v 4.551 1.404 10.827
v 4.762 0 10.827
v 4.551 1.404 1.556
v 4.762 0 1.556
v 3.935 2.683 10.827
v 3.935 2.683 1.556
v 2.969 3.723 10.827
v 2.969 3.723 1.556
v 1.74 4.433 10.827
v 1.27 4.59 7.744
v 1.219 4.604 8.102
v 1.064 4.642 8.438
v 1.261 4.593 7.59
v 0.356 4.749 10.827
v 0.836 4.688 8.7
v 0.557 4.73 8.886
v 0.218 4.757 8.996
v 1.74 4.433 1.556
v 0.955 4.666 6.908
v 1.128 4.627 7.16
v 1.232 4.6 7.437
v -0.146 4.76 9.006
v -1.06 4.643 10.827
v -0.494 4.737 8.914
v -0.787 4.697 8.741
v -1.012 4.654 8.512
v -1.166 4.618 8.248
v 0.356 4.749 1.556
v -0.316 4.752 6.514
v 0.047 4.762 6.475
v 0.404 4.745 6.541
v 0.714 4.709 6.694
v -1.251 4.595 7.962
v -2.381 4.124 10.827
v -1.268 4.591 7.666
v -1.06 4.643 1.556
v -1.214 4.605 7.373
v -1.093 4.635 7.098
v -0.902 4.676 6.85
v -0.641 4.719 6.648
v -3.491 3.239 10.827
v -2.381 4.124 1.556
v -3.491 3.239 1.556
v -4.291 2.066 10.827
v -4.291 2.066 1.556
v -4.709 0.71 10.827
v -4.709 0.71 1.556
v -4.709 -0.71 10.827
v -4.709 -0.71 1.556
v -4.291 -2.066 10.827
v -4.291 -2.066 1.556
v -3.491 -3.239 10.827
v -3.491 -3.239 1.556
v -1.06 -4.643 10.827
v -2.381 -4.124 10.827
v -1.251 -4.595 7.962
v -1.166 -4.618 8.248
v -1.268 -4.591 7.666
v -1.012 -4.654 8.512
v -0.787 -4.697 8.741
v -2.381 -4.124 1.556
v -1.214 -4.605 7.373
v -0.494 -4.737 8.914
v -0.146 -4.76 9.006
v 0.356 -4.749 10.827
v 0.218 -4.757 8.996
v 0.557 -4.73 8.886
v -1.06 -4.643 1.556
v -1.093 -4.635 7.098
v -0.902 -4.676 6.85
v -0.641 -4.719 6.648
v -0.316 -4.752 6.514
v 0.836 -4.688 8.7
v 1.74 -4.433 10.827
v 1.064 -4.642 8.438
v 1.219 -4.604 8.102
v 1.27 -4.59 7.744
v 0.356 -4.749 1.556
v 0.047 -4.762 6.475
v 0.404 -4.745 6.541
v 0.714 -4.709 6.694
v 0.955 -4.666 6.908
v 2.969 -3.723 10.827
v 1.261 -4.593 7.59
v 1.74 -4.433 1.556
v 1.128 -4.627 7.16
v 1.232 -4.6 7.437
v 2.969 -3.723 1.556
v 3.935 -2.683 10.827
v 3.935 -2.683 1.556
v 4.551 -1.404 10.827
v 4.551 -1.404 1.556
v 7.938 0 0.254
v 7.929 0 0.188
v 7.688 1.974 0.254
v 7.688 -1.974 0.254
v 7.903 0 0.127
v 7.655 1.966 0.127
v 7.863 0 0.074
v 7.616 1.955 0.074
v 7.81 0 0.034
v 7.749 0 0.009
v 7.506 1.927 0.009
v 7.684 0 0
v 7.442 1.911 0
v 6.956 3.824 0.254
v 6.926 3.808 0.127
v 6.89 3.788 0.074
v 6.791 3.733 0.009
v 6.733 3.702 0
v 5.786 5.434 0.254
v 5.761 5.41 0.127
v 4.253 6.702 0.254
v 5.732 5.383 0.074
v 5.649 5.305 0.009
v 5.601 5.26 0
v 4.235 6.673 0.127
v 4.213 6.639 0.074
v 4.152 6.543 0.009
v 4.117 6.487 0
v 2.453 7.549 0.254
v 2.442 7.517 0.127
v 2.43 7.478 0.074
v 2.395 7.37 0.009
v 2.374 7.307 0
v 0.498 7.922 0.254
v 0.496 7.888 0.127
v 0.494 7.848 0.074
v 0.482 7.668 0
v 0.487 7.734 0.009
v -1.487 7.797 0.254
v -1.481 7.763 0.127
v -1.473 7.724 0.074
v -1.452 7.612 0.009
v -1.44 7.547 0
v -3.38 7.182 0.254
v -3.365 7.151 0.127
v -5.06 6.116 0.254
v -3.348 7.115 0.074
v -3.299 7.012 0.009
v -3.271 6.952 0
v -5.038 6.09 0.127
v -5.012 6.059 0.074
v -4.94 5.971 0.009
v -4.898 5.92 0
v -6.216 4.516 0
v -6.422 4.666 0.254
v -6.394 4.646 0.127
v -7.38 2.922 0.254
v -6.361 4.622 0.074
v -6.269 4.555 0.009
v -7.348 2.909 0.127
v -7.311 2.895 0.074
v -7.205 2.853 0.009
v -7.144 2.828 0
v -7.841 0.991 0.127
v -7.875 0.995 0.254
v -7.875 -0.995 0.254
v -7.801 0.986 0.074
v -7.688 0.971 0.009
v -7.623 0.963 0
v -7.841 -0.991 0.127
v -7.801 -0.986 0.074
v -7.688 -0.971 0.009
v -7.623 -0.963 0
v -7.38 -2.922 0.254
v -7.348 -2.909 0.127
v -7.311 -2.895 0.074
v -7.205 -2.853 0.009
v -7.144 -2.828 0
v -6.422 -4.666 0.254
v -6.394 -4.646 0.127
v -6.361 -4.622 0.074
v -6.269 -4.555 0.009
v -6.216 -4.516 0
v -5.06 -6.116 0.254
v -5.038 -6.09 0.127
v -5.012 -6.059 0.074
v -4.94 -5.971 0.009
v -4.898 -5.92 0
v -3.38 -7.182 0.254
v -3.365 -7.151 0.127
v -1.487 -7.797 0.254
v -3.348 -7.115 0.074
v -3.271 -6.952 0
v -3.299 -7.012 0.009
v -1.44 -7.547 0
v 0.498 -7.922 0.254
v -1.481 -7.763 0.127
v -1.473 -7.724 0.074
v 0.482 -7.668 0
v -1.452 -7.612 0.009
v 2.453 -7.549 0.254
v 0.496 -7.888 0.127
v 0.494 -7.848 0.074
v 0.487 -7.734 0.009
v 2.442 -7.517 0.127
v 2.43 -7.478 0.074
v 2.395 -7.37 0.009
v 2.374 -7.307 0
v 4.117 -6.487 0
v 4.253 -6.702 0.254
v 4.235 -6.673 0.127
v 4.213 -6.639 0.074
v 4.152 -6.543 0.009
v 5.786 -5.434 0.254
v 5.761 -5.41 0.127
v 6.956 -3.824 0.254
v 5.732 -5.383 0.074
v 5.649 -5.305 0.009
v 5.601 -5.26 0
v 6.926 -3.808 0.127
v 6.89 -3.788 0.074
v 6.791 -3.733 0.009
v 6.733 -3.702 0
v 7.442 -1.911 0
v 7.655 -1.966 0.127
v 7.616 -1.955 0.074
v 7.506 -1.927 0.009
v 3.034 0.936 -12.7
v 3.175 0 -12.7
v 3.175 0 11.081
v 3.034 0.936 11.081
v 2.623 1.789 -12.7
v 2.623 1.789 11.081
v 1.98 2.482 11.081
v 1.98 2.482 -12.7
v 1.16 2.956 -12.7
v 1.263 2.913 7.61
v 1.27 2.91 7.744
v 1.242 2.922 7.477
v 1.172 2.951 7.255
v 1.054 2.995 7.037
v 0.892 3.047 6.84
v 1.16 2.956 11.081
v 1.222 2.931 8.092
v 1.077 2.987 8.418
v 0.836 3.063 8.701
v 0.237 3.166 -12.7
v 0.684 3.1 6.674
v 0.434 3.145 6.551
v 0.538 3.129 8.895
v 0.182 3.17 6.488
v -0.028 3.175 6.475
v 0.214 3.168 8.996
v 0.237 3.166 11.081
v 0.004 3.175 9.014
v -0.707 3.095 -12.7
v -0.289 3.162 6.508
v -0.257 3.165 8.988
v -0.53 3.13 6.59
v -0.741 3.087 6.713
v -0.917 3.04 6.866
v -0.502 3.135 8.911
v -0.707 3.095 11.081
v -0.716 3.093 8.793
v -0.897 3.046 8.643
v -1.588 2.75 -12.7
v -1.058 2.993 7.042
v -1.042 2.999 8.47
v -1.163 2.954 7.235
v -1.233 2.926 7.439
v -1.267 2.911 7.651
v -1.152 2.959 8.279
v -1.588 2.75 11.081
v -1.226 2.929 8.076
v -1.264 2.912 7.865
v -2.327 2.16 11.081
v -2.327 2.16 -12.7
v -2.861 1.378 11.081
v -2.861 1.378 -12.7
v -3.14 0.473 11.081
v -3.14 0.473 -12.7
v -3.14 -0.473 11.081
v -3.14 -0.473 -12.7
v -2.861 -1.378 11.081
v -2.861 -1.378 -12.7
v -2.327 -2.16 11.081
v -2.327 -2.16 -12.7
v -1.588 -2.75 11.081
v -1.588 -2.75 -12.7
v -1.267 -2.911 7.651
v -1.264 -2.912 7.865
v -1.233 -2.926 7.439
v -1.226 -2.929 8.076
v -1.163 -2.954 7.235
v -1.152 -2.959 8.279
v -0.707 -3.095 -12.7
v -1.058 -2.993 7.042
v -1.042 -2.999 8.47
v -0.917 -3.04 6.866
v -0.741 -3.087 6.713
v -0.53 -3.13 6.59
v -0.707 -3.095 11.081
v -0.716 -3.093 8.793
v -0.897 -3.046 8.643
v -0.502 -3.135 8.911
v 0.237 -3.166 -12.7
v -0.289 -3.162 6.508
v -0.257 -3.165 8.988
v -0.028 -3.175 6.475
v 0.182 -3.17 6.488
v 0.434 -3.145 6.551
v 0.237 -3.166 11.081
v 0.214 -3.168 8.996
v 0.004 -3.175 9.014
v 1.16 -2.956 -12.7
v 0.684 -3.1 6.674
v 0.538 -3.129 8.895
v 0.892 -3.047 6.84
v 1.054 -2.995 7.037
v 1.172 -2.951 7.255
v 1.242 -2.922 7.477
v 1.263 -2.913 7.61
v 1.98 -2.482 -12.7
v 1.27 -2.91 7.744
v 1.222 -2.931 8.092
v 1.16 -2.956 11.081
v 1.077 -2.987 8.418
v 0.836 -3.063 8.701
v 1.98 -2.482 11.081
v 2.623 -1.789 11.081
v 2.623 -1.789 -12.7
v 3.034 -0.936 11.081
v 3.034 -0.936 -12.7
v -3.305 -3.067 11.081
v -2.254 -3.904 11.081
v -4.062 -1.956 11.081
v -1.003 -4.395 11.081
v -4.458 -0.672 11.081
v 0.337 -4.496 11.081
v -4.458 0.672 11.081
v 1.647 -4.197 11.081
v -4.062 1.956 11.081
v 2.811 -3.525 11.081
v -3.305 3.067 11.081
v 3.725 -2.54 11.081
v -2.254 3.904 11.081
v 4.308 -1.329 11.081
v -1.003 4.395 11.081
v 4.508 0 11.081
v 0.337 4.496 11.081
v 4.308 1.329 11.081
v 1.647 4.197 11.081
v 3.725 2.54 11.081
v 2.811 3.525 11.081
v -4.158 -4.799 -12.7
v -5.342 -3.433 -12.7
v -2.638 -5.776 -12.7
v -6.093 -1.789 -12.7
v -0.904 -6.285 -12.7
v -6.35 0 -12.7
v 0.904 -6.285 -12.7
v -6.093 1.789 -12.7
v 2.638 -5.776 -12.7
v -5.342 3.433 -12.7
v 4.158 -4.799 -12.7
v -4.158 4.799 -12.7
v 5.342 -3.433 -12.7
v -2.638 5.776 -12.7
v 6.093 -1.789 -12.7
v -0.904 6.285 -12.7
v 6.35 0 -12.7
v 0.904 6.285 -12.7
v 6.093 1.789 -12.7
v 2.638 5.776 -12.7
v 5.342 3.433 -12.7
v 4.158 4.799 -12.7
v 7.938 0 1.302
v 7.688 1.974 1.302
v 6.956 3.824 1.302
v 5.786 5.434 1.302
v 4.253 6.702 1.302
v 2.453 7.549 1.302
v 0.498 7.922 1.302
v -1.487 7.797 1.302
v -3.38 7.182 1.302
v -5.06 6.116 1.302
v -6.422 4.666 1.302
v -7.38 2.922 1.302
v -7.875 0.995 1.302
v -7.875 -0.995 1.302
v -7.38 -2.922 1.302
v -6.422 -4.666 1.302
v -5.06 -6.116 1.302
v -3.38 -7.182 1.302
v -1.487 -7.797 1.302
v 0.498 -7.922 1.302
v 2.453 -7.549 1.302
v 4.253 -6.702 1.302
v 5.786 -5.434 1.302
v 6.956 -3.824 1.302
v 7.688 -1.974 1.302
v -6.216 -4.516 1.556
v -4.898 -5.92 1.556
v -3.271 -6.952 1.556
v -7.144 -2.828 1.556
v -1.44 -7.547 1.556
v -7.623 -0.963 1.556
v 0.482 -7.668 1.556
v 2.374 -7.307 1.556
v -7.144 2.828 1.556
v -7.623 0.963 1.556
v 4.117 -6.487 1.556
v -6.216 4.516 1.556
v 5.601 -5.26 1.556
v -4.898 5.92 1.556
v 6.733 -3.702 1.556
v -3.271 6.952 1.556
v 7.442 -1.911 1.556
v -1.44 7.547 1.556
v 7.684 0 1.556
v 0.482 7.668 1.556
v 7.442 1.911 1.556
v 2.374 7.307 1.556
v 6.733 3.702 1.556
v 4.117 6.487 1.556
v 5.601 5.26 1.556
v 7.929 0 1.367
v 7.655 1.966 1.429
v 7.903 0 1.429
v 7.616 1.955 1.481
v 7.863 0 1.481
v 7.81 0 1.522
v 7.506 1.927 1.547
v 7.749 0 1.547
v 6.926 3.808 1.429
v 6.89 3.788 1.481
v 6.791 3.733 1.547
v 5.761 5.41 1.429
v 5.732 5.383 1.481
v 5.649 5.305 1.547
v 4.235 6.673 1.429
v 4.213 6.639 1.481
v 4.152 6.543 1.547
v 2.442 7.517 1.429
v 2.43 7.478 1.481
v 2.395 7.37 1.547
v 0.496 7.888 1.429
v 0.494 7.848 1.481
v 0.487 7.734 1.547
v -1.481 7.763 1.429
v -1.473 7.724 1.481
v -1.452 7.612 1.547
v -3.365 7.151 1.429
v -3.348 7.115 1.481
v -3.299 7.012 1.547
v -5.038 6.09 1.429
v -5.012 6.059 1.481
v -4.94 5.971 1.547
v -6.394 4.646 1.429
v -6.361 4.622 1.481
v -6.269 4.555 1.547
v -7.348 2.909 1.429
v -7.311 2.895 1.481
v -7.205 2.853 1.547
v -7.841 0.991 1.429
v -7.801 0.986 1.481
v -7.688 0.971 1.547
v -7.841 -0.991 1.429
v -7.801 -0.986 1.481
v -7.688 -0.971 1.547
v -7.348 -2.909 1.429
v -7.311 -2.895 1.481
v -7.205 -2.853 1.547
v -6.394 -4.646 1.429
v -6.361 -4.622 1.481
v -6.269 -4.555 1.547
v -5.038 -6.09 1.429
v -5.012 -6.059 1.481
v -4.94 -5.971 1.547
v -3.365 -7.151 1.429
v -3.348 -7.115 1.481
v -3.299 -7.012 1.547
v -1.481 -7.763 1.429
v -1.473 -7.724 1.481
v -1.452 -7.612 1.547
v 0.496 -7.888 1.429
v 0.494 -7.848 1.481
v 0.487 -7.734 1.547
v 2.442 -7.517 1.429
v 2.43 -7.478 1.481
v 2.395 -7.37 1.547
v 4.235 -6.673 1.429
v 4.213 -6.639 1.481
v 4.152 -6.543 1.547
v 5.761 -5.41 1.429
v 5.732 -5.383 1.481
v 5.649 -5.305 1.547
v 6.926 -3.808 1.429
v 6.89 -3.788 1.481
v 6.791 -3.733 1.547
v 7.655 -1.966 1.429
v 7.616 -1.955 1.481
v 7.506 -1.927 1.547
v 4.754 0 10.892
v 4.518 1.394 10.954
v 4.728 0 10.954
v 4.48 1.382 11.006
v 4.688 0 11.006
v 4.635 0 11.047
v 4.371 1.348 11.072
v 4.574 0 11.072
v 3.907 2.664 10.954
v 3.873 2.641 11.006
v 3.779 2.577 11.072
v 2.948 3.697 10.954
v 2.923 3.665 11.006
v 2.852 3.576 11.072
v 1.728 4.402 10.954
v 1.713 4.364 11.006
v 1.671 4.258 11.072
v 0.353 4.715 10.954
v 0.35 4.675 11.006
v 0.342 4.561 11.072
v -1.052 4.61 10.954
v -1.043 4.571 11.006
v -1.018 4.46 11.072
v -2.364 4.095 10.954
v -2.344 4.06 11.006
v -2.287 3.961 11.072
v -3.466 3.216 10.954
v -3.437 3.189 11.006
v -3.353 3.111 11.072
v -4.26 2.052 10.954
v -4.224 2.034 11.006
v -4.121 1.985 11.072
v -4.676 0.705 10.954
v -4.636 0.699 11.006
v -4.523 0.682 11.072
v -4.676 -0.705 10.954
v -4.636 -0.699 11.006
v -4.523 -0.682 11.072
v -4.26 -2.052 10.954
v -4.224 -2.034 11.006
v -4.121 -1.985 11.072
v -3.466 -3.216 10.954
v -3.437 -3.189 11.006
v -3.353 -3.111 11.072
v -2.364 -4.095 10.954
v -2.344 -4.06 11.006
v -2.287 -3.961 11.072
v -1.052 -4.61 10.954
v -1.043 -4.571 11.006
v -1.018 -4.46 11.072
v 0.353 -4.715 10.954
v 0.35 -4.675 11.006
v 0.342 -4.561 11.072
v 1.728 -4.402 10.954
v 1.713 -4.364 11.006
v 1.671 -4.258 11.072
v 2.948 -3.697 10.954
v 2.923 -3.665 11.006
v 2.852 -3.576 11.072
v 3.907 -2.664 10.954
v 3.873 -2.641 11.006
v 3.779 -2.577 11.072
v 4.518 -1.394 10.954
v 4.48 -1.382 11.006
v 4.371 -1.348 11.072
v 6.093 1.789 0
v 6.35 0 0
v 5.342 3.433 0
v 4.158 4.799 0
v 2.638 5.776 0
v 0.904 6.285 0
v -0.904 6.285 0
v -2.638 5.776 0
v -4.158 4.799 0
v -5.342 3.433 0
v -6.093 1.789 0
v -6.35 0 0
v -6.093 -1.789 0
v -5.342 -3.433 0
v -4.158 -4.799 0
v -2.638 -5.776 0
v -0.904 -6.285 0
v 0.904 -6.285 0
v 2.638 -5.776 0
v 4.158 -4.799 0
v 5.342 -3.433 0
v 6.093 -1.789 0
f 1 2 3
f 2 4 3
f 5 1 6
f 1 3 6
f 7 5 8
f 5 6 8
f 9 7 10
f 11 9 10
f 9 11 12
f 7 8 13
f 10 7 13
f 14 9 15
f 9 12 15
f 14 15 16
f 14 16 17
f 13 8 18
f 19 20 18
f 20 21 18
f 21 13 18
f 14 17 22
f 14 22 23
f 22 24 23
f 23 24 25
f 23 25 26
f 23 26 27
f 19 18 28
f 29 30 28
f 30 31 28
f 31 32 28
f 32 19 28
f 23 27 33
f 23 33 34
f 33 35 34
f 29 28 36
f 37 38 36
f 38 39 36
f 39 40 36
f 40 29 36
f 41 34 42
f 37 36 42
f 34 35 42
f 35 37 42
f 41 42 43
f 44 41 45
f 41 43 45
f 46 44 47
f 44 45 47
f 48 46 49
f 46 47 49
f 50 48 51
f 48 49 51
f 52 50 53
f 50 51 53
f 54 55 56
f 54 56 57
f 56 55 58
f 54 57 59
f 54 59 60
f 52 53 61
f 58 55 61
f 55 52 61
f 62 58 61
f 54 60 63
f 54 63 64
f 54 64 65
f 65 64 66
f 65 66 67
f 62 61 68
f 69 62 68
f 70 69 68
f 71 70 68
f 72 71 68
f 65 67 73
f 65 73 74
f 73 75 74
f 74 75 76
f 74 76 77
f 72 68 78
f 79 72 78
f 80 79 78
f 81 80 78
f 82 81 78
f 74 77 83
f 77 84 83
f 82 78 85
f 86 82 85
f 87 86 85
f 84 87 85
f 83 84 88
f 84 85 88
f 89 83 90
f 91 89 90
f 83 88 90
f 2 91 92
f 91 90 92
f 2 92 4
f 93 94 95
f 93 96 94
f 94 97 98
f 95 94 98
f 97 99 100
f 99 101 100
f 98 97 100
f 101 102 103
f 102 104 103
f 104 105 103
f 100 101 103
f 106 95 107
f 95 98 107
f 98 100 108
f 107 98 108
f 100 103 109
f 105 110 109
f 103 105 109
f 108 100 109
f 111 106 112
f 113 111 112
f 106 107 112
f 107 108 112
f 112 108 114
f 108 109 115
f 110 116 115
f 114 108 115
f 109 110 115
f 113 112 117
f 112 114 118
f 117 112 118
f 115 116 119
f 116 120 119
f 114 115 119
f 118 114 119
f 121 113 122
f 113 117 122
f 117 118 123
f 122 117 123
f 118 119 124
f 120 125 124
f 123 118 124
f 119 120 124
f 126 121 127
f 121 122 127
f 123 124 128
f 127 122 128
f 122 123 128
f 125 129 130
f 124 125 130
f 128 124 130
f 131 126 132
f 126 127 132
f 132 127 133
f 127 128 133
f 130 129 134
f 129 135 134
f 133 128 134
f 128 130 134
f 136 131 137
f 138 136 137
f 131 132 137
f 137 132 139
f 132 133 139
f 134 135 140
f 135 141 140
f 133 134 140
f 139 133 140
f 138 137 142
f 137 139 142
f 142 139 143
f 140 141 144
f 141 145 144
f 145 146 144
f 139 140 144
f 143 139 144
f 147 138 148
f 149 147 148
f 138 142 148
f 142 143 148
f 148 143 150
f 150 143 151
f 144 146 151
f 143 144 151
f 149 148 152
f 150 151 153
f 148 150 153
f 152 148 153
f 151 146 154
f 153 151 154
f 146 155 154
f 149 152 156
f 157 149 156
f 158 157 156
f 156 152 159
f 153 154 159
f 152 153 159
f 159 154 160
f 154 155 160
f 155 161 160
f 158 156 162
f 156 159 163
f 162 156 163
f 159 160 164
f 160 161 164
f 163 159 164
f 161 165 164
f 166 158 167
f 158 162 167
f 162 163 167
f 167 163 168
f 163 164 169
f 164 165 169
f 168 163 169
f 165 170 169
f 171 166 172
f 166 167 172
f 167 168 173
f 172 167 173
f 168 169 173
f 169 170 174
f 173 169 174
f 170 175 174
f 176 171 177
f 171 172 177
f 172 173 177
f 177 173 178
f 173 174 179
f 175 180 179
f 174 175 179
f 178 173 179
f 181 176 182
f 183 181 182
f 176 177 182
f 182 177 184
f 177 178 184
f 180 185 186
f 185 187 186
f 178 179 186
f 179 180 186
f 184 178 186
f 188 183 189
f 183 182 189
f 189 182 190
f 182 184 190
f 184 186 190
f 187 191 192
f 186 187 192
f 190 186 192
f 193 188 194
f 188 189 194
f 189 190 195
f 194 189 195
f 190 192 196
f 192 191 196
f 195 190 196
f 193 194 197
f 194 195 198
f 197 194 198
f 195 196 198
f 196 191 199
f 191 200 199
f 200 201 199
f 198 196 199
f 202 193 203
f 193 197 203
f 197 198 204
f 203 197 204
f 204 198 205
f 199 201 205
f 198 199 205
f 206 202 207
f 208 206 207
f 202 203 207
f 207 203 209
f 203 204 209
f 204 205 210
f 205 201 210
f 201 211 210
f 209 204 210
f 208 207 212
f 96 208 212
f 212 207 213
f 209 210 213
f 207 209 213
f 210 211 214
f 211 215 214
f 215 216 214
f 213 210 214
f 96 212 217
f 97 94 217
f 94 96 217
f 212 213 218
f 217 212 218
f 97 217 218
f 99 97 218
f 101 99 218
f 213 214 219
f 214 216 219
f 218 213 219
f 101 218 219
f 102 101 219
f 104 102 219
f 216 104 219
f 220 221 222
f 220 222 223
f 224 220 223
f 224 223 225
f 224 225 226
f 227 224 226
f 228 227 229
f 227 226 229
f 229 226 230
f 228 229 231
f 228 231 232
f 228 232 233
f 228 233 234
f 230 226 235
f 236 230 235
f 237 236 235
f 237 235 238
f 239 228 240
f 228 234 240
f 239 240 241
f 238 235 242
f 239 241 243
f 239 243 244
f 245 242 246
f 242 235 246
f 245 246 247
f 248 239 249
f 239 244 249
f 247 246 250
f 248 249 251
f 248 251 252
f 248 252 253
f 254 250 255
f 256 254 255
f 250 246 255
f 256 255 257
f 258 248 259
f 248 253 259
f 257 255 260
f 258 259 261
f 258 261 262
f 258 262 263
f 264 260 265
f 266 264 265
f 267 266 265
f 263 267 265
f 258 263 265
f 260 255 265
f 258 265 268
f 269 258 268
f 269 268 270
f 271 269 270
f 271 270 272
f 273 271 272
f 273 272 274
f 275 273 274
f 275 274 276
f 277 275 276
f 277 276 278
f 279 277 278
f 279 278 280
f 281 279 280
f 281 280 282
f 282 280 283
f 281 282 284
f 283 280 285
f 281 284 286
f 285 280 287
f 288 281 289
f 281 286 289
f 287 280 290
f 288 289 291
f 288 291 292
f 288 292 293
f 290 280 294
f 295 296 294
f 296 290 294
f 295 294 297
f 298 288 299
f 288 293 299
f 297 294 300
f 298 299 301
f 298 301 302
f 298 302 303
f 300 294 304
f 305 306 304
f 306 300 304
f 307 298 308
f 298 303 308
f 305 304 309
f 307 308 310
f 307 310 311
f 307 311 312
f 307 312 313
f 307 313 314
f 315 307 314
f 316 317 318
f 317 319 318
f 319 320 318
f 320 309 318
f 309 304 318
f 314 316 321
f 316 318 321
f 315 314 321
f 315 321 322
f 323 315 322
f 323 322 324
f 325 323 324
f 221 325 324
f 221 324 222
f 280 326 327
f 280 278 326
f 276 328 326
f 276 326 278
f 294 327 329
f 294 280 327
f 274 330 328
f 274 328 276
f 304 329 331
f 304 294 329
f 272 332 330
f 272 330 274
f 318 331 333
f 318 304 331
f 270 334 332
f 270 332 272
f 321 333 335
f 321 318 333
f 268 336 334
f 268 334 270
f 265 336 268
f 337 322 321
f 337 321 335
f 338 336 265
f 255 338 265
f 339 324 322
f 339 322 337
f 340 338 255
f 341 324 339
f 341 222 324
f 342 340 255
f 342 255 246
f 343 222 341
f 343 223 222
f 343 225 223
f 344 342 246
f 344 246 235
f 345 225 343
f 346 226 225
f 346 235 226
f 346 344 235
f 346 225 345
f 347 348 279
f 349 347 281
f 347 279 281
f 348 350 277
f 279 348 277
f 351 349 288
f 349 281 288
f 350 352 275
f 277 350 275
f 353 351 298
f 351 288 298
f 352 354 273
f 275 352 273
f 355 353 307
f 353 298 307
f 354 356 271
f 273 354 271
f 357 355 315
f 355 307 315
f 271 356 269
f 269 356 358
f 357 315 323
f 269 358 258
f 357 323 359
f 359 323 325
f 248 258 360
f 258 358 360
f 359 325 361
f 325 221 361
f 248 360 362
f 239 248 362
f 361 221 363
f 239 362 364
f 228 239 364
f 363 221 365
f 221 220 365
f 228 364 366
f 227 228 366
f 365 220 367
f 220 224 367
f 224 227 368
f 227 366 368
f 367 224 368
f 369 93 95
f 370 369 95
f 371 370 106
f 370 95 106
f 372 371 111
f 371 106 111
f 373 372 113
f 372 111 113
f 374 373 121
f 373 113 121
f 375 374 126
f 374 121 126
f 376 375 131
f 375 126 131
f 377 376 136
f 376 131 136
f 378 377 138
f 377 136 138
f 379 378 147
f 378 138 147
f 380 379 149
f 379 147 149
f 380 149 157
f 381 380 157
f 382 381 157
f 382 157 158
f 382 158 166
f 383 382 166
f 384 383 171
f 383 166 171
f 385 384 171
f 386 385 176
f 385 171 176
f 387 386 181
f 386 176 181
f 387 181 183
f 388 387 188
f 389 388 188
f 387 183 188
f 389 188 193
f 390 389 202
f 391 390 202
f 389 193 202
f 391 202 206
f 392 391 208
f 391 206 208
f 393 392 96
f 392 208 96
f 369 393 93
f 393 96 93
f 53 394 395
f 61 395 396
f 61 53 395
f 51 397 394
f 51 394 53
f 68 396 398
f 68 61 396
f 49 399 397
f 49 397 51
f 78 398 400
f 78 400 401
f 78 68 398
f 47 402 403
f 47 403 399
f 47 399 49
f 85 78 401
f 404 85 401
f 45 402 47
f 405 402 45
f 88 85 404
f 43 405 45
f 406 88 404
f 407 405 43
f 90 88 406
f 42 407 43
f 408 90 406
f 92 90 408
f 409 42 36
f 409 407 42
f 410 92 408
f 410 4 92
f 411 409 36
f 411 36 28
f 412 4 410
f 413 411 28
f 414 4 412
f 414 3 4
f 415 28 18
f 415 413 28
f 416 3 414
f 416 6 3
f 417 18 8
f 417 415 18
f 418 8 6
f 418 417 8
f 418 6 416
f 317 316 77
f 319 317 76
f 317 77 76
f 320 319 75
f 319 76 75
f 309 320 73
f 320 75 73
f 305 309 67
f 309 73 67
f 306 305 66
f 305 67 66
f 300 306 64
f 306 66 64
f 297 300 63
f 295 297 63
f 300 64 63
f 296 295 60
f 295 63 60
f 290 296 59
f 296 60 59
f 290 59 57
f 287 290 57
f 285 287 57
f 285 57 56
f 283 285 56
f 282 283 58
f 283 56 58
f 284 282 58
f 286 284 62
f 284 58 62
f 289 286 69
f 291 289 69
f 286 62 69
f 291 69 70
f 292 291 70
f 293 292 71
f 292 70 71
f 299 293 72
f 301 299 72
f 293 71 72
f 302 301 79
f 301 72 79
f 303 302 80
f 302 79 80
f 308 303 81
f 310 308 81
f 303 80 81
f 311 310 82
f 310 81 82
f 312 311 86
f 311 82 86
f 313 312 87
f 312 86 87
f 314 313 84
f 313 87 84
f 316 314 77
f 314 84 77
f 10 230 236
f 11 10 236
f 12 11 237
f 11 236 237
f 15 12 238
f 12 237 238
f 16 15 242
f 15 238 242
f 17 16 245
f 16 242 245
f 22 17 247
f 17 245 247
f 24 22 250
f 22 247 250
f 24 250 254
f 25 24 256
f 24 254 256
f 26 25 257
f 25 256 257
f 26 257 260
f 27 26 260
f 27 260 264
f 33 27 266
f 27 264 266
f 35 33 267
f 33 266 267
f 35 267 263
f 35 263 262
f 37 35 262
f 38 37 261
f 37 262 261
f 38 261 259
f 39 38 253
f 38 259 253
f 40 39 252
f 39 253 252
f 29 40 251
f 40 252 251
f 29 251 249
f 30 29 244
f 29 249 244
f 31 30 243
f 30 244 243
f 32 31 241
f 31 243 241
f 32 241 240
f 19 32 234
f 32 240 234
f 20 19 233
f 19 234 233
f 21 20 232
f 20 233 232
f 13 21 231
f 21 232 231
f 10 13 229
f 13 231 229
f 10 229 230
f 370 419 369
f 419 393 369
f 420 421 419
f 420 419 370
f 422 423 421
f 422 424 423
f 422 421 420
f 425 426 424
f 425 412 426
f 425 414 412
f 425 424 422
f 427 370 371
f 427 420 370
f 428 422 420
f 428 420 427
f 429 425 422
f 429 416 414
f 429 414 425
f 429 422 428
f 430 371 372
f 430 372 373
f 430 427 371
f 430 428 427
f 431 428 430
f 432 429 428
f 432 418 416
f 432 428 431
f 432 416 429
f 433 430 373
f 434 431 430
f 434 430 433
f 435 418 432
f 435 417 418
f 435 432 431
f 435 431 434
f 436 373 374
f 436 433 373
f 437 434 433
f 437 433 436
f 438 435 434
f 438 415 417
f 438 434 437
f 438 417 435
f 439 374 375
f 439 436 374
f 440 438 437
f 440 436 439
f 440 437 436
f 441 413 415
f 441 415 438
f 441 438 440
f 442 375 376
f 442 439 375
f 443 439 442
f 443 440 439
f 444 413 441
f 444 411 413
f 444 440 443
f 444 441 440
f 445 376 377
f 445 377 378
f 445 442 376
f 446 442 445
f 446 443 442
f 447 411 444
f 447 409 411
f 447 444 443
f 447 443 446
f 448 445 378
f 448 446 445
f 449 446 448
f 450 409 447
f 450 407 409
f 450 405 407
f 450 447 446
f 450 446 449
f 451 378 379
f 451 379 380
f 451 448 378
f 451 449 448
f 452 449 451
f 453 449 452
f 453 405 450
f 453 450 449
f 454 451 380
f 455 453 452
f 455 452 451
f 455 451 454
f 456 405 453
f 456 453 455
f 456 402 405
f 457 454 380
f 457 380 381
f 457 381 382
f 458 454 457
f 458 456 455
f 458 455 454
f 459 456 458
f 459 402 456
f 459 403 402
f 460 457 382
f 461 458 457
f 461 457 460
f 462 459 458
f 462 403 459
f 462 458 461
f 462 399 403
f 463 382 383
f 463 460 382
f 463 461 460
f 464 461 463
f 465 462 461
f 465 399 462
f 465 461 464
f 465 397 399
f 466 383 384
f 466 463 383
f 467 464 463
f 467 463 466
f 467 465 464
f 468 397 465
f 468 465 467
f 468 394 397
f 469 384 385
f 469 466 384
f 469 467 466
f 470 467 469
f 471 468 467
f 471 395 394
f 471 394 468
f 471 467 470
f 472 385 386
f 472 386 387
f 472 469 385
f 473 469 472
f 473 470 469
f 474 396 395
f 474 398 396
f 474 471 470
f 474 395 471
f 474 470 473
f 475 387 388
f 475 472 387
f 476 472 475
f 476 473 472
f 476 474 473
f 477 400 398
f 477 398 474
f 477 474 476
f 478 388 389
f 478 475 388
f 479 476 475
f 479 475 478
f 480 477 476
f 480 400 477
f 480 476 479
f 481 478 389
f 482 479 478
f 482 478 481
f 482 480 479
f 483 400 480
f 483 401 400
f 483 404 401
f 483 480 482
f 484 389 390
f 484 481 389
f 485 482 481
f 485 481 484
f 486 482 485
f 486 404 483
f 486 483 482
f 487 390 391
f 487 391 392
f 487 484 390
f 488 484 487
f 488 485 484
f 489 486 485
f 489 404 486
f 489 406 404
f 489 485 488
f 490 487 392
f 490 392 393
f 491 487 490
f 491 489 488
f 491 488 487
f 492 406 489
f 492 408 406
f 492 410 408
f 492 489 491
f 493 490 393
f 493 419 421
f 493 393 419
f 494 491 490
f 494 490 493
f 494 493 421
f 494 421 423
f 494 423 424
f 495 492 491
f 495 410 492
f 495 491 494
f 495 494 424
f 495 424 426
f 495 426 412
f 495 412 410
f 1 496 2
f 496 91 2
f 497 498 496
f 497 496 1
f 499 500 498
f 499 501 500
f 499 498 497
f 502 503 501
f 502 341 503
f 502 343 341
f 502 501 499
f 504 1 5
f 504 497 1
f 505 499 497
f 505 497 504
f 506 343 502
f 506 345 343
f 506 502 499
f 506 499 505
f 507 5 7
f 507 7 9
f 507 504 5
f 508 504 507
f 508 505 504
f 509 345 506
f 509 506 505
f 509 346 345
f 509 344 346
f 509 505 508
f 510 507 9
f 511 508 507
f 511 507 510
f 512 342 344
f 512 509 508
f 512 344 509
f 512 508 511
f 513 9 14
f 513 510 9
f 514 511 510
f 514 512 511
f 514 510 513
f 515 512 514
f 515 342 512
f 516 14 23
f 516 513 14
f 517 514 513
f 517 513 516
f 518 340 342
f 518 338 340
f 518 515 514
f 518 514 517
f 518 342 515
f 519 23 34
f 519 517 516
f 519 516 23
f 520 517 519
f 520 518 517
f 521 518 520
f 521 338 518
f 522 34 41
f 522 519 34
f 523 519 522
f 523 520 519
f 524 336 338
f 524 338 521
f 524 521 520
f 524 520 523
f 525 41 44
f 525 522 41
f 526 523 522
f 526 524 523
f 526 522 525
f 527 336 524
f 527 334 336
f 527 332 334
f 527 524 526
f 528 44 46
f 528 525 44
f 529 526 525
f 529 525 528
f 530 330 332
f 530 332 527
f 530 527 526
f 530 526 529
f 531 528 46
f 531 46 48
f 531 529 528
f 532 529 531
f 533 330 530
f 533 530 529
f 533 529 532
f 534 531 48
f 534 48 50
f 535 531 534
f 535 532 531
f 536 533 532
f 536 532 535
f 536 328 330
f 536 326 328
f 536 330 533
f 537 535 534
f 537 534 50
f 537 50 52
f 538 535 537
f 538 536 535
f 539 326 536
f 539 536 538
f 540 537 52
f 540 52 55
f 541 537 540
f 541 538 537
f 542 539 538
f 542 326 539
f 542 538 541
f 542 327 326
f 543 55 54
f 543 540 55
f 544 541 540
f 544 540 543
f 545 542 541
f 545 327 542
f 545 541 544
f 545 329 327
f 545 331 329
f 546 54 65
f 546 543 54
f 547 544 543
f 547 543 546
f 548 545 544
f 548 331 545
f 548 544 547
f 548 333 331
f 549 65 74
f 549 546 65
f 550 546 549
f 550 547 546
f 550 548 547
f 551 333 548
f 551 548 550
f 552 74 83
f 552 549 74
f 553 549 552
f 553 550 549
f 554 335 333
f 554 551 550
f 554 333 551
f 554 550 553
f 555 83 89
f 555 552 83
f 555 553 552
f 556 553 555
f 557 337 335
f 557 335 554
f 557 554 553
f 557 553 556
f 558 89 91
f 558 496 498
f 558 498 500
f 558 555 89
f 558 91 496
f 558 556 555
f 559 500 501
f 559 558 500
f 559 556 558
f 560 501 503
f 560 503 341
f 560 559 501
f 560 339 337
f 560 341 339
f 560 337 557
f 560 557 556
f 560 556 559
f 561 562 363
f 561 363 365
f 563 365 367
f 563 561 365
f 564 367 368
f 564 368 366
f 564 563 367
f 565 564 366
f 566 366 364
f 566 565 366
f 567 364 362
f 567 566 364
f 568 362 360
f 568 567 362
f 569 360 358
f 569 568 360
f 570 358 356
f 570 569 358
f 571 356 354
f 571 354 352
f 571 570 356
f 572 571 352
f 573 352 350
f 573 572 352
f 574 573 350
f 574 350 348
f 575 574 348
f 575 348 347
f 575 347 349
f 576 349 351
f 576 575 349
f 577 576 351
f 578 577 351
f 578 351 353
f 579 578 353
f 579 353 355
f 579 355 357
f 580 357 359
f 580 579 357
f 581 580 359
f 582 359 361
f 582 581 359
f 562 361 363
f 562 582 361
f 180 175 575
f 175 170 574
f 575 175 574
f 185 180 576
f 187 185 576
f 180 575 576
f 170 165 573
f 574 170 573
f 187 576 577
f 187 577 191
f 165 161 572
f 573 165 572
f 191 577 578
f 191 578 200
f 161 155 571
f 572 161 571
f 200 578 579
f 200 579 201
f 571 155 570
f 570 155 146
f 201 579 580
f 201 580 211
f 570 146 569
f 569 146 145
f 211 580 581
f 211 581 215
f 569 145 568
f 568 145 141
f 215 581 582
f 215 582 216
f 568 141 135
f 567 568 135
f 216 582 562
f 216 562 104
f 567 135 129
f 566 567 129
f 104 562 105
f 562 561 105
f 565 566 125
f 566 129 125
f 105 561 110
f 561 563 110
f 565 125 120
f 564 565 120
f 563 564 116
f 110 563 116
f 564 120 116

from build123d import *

# Parameters (mm, degrees)
F0_R      = 6.35
F1_DEPTH  = 12.7
F2_R      = 7.9375
F3_DEPTH  = 1.55575
F4_R      = 4.7625
F5_DEPTH  = 9.525
F6_R      = 0.254
F7_R      = 1.27
F8_DEPTH  = 12.7
F9_R      = 3.175
F10_DEPTH = 23.78175


with BuildPart() as f1:
    # F0 (on Top) → F1 (new body)
    with BuildSketch(Plane.XY):
        Circle(F0_R)
    extrude(amount=-F1_DEPTH)

    # F2 (on face) → F3 (join)
    with BuildSketch(Plane.XY):
        Circle(F2_R)
    extrude(amount=F3_DEPTH)

    # F4 (on face) → F5 (join)
    with BuildSketch(Plane.XY.offset(1.55575)):
        Circle(F4_R)
    extrude(amount=F5_DEPTH)

    # F6
    f6_edges = [f1.edges().sort_by_distance(p)[0] for p in [
        (-7.9375, 0, 1.55575),
        (-7.9375, 0, 0),
        (-4.7625, 0, 11.08075),
    ]]
    fillet(f6_edges, radius=F6_R)

    # F7 (on Front) → F8 (cut, symmetric)
    with BuildSketch(Plane.XZ):
        with Locations((0, 7.744468)):
            Circle(F7_R)
    extrude(amount=F8_DEPTH, both=True, mode=Mode.SUBTRACT)

    # F9 (on face) → F10 (cut, through all)
    with BuildSketch(Plane.XY.offset(11.08075)):
        Circle(F9_R)
    extrude(amount=-F10_DEPTH, mode=Mode.SUBTRACT)


solid = f1.part
